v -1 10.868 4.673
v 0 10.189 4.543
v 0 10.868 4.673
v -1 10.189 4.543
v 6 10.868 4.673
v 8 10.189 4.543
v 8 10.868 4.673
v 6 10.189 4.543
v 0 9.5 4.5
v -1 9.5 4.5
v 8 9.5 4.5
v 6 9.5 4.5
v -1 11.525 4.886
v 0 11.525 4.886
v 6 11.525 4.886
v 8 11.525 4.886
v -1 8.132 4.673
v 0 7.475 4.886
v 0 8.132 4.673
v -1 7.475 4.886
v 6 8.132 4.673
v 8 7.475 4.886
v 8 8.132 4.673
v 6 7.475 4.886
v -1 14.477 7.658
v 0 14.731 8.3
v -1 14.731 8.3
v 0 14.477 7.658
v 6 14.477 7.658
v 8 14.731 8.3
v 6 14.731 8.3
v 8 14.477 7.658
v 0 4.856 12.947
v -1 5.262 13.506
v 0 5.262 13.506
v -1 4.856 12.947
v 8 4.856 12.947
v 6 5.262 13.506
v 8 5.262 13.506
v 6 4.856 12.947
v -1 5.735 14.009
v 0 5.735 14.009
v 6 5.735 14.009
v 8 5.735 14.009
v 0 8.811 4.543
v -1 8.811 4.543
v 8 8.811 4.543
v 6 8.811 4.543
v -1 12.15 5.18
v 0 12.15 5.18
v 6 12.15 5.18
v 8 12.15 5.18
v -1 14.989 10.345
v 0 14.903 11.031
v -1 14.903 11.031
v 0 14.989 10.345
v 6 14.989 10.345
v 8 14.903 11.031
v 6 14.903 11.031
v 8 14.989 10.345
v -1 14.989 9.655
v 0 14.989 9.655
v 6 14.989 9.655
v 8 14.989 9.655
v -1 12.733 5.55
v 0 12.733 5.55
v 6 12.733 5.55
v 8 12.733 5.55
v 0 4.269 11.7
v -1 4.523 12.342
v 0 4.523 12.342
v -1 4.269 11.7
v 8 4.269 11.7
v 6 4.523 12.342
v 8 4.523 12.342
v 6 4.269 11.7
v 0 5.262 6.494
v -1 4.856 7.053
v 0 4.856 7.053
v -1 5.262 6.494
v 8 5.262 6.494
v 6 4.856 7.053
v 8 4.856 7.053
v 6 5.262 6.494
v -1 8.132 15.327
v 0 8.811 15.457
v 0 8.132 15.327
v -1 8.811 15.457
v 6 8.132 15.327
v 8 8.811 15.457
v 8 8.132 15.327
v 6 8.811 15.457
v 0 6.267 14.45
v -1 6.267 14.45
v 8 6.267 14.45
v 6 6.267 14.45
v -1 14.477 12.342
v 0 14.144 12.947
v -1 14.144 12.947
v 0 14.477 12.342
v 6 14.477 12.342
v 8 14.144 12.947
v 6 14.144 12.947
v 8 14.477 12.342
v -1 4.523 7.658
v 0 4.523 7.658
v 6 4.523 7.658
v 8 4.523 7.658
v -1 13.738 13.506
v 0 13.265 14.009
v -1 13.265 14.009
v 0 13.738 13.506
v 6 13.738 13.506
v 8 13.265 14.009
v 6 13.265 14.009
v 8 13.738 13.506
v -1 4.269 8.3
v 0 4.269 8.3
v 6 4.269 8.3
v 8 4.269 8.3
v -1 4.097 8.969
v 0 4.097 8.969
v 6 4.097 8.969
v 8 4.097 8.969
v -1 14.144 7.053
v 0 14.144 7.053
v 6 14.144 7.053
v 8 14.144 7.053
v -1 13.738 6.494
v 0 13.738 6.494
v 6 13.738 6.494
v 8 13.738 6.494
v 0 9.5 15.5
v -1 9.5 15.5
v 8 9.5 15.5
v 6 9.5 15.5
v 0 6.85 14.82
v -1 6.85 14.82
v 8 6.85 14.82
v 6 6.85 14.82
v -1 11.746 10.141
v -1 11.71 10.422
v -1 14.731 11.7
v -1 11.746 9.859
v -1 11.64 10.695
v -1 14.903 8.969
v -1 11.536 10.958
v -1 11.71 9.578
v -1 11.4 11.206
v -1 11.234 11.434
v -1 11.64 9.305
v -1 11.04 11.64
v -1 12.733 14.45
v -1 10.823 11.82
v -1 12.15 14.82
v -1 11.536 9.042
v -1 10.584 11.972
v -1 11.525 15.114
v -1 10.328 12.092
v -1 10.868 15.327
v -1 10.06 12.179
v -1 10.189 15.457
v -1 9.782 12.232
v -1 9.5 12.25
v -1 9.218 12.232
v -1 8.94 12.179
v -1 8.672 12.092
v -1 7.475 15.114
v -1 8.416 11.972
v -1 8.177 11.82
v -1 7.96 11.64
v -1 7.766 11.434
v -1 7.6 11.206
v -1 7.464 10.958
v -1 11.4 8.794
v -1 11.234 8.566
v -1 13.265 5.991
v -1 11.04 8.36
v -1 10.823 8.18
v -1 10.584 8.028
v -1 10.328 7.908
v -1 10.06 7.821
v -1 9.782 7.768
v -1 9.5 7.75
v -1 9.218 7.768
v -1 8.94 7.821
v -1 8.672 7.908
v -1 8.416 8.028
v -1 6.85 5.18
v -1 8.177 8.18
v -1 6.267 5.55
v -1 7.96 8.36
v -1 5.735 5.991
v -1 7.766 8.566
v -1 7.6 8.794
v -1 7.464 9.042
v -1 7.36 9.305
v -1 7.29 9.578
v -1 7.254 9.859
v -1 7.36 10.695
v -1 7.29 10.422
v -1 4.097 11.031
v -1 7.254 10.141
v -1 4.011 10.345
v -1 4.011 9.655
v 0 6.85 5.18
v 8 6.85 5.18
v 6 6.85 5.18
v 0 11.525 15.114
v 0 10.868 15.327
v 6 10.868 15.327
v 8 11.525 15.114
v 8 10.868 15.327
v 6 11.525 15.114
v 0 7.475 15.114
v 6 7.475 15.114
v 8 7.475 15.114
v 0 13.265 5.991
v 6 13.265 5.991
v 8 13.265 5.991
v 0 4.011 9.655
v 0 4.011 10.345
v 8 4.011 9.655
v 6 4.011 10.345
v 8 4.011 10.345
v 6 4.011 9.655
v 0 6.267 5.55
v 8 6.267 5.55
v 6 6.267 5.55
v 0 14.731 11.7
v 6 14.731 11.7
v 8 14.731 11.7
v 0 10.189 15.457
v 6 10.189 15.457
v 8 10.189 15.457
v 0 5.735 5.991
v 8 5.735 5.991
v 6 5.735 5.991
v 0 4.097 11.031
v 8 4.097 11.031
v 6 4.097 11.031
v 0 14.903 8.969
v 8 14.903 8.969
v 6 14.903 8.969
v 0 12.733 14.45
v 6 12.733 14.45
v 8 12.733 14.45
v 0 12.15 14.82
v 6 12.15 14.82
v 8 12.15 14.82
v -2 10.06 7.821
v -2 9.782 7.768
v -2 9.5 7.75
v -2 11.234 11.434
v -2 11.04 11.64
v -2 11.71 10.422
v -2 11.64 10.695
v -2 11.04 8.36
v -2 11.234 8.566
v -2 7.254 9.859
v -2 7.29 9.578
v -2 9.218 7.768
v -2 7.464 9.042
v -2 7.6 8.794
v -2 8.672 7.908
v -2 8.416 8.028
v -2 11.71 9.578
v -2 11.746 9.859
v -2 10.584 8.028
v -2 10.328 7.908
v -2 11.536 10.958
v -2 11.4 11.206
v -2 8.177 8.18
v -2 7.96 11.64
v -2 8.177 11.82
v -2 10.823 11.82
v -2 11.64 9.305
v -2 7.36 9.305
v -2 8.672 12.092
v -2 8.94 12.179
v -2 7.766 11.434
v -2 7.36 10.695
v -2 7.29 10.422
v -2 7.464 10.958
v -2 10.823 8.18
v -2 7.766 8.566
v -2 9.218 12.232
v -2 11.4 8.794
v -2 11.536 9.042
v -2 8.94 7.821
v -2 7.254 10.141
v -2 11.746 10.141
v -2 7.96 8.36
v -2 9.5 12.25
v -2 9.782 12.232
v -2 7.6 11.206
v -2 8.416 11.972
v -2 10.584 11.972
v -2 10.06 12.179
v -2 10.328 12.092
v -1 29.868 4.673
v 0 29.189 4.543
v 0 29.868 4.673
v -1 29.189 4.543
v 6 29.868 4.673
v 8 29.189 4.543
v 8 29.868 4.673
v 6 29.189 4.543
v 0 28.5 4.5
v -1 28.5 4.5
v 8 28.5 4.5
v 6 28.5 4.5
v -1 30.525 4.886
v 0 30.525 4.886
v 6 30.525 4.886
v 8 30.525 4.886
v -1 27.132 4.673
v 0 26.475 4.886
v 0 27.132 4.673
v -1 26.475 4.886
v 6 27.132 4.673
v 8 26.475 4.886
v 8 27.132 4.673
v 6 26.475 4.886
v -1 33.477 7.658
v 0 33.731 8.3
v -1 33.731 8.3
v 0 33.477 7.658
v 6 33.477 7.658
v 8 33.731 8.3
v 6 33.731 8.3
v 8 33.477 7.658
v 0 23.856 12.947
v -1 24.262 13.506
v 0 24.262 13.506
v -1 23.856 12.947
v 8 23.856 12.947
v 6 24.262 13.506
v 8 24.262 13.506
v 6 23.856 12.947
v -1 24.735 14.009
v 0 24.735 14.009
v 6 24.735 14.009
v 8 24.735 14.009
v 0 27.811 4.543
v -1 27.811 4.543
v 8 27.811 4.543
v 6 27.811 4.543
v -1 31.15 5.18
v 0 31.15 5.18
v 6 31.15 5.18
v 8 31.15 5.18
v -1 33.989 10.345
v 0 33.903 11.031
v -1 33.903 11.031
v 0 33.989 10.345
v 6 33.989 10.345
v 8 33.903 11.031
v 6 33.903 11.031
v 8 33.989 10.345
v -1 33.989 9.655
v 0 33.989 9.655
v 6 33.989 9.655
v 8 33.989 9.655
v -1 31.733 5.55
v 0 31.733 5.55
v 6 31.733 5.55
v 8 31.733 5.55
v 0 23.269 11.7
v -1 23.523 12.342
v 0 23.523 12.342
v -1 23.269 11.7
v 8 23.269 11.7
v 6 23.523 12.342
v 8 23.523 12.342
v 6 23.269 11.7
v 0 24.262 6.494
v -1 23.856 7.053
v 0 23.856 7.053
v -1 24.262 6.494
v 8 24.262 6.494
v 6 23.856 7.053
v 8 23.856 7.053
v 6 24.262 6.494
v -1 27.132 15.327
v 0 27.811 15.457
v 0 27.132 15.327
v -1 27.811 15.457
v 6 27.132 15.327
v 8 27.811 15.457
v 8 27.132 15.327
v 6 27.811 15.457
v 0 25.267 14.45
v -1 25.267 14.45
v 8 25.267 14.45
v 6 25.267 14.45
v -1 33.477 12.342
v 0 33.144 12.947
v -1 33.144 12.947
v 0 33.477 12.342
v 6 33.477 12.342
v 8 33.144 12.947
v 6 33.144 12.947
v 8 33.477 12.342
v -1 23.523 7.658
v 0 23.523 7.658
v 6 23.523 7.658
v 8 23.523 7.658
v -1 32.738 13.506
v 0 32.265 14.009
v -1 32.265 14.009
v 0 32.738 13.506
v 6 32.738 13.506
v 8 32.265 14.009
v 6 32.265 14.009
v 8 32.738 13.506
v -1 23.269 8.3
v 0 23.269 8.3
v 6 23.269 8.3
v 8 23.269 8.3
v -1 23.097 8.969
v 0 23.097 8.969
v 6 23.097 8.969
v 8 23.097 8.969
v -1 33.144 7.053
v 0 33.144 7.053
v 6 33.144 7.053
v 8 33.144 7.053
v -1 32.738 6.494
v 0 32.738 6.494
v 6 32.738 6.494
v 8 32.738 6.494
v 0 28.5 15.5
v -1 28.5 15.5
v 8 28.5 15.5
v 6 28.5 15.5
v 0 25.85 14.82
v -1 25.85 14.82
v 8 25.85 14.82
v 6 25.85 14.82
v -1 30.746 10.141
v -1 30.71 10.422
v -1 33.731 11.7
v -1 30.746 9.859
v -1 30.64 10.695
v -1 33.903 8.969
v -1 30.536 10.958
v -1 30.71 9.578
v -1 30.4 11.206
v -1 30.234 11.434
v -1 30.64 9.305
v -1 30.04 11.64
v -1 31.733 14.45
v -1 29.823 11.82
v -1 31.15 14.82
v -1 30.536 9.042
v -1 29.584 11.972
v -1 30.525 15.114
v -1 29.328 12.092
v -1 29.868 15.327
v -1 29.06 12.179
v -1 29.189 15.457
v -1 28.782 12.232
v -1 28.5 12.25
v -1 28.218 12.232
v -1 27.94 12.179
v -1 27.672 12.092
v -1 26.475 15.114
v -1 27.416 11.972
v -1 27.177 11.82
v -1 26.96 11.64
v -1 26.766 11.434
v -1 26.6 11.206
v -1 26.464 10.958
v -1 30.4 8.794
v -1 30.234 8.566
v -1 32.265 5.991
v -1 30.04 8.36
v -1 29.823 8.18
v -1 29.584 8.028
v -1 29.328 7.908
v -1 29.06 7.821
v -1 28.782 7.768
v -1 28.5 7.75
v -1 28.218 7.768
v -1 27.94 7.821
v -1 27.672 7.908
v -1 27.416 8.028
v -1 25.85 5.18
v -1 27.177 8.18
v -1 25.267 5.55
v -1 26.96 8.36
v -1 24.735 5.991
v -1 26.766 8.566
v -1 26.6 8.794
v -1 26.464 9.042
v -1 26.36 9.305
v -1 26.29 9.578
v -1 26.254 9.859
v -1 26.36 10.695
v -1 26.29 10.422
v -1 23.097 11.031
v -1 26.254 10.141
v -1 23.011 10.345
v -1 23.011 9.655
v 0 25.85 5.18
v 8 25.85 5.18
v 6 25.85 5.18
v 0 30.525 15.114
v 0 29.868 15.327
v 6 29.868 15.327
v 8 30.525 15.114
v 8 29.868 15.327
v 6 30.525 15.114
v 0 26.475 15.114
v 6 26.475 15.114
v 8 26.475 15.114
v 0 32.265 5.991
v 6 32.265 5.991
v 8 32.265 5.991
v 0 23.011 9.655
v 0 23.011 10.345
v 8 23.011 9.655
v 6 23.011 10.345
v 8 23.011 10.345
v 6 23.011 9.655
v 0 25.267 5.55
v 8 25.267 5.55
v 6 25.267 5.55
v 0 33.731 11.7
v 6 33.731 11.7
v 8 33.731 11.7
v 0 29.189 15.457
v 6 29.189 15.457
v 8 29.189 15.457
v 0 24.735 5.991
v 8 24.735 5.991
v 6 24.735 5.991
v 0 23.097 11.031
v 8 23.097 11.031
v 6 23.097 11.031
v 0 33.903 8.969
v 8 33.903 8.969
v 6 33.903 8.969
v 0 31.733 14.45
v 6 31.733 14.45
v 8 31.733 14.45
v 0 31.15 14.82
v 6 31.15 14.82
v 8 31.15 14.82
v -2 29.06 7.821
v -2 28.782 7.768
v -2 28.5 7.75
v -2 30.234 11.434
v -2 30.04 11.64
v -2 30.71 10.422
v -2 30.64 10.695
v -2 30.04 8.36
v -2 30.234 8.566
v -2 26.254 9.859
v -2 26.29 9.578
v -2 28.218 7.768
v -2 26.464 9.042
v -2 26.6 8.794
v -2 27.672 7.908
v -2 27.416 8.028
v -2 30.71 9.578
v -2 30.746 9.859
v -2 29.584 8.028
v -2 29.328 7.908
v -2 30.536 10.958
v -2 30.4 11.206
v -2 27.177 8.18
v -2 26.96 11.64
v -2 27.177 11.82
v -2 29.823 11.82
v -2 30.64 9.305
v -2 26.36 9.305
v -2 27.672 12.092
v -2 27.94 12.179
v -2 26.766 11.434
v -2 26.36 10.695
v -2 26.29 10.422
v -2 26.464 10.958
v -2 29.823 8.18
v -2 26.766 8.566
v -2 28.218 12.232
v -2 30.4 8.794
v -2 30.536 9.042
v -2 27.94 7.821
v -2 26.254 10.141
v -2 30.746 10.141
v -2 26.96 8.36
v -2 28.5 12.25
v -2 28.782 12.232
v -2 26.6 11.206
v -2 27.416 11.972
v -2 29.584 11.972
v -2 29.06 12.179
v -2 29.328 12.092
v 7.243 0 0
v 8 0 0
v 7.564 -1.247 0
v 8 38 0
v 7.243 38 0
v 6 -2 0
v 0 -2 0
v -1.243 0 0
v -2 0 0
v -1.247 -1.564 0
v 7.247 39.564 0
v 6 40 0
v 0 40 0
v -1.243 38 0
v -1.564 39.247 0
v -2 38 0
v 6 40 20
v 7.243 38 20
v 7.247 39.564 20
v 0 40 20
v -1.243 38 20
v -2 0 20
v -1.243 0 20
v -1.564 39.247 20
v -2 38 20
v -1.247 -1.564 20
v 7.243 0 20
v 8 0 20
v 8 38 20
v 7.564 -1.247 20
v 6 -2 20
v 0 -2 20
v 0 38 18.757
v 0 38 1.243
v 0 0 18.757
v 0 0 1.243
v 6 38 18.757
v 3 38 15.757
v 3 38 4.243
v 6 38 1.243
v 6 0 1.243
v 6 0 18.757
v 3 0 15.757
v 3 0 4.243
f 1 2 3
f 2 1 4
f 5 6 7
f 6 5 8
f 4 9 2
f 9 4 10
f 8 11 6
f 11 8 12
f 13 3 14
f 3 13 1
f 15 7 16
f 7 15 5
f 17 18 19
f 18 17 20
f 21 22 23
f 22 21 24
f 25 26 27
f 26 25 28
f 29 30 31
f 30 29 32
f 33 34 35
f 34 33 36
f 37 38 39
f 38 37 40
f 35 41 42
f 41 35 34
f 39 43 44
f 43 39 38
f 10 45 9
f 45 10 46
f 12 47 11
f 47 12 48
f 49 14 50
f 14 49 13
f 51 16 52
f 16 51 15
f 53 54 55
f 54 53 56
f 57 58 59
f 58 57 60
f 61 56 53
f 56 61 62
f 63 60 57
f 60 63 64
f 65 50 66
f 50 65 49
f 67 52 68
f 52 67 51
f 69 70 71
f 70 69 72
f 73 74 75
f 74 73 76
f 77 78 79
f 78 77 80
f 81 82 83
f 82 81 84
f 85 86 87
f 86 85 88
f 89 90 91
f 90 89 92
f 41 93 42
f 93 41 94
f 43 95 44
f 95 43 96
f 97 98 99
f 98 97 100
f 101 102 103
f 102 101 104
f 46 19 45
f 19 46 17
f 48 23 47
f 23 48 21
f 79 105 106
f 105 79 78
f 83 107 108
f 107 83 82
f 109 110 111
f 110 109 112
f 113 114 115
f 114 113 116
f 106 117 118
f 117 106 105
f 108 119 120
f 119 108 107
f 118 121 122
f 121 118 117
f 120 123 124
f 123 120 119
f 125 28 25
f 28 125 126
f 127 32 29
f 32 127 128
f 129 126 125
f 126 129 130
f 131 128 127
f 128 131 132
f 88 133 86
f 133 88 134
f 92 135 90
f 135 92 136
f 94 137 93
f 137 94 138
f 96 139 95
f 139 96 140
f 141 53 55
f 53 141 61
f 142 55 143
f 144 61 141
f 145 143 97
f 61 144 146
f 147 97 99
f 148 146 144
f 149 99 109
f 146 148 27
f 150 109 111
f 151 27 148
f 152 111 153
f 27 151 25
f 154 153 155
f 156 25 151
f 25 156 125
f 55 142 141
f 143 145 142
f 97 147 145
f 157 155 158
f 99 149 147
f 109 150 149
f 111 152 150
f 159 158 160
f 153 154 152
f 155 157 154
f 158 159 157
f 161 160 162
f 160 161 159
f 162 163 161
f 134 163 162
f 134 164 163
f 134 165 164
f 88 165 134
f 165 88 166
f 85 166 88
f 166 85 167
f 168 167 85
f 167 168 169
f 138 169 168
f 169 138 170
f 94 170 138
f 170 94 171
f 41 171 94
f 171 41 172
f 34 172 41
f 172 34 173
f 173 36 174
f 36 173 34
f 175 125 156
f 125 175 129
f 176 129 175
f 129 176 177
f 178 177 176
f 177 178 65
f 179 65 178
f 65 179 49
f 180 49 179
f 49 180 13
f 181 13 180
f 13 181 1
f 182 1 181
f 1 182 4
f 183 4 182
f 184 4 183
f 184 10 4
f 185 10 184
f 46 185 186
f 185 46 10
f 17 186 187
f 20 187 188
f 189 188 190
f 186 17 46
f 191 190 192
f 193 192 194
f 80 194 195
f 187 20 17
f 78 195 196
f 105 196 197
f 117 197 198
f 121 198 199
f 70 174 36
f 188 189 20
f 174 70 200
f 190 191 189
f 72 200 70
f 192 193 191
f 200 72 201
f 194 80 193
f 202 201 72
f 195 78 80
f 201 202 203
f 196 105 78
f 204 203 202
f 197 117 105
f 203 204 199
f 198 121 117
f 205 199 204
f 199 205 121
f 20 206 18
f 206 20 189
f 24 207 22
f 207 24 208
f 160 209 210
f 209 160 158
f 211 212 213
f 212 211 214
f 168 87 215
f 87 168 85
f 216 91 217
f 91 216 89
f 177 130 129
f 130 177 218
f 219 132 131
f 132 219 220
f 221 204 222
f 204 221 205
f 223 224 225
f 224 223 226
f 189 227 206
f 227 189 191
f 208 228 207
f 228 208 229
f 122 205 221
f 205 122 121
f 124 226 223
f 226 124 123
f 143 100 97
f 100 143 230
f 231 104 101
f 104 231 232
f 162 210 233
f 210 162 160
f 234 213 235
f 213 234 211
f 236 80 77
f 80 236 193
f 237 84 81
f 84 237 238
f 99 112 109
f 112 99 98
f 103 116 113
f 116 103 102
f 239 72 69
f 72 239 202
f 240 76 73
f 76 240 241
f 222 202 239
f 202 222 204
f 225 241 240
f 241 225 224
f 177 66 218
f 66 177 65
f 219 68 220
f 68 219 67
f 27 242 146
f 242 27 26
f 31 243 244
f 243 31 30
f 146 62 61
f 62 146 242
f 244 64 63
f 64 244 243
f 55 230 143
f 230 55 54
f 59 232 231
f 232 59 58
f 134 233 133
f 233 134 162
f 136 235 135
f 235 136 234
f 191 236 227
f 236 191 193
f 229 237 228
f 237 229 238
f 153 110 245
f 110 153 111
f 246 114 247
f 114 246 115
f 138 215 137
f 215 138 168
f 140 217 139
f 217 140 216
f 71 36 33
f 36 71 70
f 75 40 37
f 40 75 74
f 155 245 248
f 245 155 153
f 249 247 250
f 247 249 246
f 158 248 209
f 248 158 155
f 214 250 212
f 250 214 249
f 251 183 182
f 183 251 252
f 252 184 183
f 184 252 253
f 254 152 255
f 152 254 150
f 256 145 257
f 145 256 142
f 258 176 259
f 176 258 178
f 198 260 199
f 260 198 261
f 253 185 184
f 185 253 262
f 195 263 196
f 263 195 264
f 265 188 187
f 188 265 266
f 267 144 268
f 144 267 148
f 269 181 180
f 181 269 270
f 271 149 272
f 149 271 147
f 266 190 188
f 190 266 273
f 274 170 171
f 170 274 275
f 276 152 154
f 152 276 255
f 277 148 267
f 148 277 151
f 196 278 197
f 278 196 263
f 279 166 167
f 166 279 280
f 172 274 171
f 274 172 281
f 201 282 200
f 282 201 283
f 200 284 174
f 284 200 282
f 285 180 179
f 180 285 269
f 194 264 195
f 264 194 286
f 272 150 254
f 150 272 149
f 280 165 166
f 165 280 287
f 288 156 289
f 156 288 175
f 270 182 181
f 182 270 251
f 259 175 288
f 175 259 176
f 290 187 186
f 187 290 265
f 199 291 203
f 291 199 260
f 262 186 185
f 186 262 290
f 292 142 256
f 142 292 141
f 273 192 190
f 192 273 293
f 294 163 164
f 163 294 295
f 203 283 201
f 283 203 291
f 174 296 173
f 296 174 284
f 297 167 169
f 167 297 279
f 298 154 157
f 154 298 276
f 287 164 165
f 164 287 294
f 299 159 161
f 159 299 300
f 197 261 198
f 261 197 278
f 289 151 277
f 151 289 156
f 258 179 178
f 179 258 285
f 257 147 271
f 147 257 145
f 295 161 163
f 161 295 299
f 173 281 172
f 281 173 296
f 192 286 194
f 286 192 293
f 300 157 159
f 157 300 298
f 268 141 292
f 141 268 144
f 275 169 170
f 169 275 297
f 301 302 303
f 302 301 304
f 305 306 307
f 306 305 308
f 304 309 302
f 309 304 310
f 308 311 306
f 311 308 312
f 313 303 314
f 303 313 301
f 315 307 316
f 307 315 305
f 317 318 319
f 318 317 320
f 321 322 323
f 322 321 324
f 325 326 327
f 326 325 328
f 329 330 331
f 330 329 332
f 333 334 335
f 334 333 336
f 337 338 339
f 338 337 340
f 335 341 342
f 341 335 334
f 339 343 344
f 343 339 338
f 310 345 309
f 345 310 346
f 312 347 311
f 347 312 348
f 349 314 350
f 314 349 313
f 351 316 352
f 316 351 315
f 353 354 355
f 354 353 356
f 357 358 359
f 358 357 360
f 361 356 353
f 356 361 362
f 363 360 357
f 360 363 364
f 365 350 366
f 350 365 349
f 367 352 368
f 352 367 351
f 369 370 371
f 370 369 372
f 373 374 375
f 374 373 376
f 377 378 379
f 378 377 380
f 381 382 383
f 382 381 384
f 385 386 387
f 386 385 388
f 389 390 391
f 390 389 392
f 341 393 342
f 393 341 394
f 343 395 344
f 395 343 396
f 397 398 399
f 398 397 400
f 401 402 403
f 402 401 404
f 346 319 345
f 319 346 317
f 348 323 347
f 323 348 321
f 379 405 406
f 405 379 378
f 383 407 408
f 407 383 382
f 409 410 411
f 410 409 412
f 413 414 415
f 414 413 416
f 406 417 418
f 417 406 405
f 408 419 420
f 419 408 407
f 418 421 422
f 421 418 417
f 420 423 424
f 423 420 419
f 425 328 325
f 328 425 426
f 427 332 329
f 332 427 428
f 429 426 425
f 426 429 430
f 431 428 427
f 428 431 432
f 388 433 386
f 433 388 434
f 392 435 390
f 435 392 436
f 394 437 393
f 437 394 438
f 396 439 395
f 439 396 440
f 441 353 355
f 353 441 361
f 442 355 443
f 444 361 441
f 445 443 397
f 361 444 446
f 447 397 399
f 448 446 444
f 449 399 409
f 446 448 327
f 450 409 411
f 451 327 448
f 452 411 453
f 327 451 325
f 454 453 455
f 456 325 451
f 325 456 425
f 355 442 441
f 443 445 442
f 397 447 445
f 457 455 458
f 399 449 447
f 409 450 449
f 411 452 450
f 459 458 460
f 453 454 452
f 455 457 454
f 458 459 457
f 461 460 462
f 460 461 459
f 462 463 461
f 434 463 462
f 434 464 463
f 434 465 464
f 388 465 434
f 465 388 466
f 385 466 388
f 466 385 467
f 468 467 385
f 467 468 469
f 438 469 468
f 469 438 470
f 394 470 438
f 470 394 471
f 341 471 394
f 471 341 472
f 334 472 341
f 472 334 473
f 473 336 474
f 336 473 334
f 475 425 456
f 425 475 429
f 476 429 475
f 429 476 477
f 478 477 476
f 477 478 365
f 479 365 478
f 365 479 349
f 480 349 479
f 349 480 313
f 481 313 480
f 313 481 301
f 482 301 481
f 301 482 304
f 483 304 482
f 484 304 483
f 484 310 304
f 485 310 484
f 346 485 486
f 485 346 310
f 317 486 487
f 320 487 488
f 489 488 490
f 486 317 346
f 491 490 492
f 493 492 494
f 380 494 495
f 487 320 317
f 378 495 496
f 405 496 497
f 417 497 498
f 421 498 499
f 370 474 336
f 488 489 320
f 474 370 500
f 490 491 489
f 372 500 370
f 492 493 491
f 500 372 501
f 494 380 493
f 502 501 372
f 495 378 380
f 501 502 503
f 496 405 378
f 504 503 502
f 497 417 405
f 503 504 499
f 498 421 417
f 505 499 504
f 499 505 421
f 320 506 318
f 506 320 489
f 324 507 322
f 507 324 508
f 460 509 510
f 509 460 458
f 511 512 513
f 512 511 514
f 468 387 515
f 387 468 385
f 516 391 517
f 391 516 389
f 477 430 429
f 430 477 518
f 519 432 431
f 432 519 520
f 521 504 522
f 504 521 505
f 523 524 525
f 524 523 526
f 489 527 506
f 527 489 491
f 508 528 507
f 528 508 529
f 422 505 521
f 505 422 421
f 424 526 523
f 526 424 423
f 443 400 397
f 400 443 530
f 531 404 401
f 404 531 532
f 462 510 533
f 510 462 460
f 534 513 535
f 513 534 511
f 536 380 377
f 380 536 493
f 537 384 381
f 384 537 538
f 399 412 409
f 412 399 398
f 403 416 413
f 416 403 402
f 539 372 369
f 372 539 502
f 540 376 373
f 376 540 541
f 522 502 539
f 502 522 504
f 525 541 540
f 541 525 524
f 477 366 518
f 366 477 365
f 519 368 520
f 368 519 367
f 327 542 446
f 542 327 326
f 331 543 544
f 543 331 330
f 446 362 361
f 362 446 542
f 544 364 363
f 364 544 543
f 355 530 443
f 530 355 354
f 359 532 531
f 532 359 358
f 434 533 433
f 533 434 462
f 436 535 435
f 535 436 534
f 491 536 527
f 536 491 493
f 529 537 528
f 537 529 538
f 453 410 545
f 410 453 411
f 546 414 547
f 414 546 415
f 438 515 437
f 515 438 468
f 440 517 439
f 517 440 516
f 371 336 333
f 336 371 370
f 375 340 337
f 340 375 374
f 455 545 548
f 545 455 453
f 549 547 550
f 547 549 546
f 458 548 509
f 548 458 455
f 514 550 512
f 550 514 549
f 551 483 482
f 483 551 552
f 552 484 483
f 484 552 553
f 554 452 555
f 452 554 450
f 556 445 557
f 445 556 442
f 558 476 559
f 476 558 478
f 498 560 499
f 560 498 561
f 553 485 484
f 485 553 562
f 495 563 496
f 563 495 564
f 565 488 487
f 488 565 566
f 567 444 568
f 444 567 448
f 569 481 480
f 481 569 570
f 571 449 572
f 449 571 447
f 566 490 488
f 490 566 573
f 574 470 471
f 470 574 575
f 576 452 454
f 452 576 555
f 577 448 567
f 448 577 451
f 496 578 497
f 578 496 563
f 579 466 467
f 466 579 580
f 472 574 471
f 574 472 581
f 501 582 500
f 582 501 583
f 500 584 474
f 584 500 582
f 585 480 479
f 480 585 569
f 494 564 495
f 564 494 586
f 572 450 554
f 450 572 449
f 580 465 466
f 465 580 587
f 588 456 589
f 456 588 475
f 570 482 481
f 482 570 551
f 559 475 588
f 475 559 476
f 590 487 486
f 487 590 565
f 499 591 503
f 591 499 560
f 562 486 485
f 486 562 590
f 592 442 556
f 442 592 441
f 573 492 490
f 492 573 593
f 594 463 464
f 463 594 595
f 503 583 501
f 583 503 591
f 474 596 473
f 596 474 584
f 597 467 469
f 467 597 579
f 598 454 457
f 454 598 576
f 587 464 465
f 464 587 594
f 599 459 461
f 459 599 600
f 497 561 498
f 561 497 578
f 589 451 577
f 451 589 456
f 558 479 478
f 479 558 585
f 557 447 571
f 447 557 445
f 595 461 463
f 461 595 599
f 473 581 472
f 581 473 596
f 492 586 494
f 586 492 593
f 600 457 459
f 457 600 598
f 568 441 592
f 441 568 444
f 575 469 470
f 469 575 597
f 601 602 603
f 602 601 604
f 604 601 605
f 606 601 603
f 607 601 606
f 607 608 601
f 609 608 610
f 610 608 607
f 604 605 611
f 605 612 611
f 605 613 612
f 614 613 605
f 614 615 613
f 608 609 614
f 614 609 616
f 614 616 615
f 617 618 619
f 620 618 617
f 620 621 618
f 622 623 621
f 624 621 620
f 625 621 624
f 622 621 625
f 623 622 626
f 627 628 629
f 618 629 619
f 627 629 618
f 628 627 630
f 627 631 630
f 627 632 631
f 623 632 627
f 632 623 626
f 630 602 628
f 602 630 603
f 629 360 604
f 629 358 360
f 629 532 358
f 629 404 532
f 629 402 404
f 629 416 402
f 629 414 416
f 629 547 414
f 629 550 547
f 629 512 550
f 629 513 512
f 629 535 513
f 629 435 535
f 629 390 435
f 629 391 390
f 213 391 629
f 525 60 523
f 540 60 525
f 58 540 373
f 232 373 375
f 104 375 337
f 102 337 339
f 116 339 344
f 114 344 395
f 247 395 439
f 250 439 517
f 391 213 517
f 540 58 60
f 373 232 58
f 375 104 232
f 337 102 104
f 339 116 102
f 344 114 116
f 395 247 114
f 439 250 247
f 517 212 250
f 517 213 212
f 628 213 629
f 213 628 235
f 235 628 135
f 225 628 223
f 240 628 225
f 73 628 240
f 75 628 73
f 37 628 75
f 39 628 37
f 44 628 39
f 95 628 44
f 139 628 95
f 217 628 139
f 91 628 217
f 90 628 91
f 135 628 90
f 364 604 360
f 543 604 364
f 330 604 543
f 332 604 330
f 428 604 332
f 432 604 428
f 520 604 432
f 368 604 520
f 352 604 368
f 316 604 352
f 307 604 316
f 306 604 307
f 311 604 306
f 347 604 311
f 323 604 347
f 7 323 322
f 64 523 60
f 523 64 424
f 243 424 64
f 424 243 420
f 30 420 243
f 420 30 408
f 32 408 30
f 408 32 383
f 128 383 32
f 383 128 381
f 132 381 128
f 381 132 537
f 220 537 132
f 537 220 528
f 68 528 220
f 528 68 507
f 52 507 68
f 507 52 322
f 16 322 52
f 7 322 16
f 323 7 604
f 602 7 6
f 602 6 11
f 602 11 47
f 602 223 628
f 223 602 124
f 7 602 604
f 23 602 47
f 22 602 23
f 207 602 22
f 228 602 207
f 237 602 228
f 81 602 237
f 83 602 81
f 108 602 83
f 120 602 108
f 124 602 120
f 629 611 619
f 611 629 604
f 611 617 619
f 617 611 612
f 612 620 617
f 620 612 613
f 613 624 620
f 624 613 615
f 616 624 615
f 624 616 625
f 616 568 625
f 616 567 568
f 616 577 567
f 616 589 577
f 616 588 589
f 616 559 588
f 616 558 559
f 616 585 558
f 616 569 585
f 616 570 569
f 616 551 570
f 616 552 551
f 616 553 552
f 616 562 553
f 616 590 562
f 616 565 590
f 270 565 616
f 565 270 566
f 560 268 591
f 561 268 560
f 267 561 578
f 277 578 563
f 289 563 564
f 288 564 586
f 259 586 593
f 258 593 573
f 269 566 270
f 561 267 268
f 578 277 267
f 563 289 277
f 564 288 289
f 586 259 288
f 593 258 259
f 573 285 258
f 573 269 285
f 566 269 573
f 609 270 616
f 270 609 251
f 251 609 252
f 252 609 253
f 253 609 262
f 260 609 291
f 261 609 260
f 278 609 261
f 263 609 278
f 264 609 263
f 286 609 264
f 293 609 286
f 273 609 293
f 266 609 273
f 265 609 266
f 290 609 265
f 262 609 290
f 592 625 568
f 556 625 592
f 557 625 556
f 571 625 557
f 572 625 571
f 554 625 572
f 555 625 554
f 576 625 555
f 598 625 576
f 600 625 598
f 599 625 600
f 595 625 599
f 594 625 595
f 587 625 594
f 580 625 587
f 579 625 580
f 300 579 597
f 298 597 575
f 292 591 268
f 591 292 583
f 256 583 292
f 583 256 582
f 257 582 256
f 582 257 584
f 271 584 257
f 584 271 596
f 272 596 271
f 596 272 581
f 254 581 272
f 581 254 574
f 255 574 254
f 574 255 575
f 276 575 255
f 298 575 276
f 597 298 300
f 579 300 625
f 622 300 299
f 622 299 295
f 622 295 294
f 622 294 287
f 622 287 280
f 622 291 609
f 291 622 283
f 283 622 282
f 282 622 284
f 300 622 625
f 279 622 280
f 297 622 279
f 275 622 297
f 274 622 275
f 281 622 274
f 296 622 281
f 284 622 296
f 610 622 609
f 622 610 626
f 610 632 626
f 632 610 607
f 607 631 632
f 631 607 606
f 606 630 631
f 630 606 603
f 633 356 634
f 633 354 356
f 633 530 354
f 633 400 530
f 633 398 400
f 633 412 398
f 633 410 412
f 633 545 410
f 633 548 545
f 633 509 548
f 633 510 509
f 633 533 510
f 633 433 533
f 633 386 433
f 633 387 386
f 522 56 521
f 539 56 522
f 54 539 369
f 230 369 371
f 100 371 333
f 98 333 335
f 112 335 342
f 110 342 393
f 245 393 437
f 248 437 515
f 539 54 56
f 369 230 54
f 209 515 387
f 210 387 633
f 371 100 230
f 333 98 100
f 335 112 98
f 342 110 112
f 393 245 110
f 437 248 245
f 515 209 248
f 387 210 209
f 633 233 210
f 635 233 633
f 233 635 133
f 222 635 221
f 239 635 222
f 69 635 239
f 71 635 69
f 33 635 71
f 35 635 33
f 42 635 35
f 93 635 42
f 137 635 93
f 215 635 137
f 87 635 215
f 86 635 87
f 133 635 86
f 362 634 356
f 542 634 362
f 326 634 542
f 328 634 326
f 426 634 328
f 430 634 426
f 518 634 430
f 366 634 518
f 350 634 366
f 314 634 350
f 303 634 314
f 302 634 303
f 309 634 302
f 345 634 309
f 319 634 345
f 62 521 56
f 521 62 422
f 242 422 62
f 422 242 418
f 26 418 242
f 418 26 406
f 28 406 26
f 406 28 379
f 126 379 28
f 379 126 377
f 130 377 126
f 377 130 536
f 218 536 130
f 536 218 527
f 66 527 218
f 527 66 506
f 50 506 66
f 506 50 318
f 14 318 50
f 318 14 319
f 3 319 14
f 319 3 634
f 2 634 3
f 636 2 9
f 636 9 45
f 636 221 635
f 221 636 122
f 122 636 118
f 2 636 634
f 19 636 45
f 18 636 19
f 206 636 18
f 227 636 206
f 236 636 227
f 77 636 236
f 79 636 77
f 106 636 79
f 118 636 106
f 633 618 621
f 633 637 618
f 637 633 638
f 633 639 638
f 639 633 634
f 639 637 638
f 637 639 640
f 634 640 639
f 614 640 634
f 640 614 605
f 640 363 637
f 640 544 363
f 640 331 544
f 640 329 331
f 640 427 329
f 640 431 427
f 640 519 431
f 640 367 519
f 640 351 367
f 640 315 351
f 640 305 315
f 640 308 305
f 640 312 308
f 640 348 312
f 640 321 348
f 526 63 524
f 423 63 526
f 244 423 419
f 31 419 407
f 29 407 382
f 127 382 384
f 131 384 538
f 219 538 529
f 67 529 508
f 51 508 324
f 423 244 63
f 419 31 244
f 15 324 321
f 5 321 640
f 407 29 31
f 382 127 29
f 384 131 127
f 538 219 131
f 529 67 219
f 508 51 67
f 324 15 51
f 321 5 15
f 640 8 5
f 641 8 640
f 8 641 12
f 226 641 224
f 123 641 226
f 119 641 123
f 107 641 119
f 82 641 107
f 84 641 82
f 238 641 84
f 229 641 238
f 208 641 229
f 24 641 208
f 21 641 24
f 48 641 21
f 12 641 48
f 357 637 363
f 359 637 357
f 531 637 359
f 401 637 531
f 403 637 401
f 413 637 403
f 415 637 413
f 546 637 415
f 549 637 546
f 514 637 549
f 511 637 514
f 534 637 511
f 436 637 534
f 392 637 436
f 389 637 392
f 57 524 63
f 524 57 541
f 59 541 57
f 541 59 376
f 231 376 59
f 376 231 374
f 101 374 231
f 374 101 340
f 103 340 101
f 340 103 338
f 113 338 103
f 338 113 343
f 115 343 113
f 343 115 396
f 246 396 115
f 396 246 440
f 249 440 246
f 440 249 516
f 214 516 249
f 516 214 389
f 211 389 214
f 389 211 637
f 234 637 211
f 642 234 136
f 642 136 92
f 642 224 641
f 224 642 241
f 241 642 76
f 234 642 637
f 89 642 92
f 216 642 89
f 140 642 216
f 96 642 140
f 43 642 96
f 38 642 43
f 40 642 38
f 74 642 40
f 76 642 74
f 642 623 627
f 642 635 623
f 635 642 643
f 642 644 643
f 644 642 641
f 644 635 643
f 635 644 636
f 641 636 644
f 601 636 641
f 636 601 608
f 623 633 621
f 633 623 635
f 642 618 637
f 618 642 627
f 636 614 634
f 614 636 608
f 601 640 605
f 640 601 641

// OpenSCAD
module fullClip(ht, wd, cap, t) {
    difference() {
        linear_extrude(wd)
        difference() {
            offset(r=t)
            square([cap, ht]);
            square([cap, ht]);
        }
        union() {
            translate([-1,ht/4, wd/2])
            screwHole(wd, 11, 4.5);
            translate([-1,3*ht/4, wd/2])
            screwHole(wd, 11, 4.5);
        }
        translate([cap/2,0,wd -sqrt(((cap)*(cap))/2)])
        rotate([0,-45,0])
        cube(ht);
        translate([cap/2,0,sqrt(((cap)*(cap))/2)])
        rotate([0,135,0])
        cube(ht);
    }
    
    
}

module screwHole(length, head, shank) {
    rotate([0,90,0])
    union() {
        cylinder(h=length, d=head, $fn=50);
        translate([0,0,-length])
        cylinder(h=length, d=shank, $fn=50);
    }
}
//rotate([0,90,0])
//screwHole(10, 10, 5);
fullClip(38, 20, 6, 2);
